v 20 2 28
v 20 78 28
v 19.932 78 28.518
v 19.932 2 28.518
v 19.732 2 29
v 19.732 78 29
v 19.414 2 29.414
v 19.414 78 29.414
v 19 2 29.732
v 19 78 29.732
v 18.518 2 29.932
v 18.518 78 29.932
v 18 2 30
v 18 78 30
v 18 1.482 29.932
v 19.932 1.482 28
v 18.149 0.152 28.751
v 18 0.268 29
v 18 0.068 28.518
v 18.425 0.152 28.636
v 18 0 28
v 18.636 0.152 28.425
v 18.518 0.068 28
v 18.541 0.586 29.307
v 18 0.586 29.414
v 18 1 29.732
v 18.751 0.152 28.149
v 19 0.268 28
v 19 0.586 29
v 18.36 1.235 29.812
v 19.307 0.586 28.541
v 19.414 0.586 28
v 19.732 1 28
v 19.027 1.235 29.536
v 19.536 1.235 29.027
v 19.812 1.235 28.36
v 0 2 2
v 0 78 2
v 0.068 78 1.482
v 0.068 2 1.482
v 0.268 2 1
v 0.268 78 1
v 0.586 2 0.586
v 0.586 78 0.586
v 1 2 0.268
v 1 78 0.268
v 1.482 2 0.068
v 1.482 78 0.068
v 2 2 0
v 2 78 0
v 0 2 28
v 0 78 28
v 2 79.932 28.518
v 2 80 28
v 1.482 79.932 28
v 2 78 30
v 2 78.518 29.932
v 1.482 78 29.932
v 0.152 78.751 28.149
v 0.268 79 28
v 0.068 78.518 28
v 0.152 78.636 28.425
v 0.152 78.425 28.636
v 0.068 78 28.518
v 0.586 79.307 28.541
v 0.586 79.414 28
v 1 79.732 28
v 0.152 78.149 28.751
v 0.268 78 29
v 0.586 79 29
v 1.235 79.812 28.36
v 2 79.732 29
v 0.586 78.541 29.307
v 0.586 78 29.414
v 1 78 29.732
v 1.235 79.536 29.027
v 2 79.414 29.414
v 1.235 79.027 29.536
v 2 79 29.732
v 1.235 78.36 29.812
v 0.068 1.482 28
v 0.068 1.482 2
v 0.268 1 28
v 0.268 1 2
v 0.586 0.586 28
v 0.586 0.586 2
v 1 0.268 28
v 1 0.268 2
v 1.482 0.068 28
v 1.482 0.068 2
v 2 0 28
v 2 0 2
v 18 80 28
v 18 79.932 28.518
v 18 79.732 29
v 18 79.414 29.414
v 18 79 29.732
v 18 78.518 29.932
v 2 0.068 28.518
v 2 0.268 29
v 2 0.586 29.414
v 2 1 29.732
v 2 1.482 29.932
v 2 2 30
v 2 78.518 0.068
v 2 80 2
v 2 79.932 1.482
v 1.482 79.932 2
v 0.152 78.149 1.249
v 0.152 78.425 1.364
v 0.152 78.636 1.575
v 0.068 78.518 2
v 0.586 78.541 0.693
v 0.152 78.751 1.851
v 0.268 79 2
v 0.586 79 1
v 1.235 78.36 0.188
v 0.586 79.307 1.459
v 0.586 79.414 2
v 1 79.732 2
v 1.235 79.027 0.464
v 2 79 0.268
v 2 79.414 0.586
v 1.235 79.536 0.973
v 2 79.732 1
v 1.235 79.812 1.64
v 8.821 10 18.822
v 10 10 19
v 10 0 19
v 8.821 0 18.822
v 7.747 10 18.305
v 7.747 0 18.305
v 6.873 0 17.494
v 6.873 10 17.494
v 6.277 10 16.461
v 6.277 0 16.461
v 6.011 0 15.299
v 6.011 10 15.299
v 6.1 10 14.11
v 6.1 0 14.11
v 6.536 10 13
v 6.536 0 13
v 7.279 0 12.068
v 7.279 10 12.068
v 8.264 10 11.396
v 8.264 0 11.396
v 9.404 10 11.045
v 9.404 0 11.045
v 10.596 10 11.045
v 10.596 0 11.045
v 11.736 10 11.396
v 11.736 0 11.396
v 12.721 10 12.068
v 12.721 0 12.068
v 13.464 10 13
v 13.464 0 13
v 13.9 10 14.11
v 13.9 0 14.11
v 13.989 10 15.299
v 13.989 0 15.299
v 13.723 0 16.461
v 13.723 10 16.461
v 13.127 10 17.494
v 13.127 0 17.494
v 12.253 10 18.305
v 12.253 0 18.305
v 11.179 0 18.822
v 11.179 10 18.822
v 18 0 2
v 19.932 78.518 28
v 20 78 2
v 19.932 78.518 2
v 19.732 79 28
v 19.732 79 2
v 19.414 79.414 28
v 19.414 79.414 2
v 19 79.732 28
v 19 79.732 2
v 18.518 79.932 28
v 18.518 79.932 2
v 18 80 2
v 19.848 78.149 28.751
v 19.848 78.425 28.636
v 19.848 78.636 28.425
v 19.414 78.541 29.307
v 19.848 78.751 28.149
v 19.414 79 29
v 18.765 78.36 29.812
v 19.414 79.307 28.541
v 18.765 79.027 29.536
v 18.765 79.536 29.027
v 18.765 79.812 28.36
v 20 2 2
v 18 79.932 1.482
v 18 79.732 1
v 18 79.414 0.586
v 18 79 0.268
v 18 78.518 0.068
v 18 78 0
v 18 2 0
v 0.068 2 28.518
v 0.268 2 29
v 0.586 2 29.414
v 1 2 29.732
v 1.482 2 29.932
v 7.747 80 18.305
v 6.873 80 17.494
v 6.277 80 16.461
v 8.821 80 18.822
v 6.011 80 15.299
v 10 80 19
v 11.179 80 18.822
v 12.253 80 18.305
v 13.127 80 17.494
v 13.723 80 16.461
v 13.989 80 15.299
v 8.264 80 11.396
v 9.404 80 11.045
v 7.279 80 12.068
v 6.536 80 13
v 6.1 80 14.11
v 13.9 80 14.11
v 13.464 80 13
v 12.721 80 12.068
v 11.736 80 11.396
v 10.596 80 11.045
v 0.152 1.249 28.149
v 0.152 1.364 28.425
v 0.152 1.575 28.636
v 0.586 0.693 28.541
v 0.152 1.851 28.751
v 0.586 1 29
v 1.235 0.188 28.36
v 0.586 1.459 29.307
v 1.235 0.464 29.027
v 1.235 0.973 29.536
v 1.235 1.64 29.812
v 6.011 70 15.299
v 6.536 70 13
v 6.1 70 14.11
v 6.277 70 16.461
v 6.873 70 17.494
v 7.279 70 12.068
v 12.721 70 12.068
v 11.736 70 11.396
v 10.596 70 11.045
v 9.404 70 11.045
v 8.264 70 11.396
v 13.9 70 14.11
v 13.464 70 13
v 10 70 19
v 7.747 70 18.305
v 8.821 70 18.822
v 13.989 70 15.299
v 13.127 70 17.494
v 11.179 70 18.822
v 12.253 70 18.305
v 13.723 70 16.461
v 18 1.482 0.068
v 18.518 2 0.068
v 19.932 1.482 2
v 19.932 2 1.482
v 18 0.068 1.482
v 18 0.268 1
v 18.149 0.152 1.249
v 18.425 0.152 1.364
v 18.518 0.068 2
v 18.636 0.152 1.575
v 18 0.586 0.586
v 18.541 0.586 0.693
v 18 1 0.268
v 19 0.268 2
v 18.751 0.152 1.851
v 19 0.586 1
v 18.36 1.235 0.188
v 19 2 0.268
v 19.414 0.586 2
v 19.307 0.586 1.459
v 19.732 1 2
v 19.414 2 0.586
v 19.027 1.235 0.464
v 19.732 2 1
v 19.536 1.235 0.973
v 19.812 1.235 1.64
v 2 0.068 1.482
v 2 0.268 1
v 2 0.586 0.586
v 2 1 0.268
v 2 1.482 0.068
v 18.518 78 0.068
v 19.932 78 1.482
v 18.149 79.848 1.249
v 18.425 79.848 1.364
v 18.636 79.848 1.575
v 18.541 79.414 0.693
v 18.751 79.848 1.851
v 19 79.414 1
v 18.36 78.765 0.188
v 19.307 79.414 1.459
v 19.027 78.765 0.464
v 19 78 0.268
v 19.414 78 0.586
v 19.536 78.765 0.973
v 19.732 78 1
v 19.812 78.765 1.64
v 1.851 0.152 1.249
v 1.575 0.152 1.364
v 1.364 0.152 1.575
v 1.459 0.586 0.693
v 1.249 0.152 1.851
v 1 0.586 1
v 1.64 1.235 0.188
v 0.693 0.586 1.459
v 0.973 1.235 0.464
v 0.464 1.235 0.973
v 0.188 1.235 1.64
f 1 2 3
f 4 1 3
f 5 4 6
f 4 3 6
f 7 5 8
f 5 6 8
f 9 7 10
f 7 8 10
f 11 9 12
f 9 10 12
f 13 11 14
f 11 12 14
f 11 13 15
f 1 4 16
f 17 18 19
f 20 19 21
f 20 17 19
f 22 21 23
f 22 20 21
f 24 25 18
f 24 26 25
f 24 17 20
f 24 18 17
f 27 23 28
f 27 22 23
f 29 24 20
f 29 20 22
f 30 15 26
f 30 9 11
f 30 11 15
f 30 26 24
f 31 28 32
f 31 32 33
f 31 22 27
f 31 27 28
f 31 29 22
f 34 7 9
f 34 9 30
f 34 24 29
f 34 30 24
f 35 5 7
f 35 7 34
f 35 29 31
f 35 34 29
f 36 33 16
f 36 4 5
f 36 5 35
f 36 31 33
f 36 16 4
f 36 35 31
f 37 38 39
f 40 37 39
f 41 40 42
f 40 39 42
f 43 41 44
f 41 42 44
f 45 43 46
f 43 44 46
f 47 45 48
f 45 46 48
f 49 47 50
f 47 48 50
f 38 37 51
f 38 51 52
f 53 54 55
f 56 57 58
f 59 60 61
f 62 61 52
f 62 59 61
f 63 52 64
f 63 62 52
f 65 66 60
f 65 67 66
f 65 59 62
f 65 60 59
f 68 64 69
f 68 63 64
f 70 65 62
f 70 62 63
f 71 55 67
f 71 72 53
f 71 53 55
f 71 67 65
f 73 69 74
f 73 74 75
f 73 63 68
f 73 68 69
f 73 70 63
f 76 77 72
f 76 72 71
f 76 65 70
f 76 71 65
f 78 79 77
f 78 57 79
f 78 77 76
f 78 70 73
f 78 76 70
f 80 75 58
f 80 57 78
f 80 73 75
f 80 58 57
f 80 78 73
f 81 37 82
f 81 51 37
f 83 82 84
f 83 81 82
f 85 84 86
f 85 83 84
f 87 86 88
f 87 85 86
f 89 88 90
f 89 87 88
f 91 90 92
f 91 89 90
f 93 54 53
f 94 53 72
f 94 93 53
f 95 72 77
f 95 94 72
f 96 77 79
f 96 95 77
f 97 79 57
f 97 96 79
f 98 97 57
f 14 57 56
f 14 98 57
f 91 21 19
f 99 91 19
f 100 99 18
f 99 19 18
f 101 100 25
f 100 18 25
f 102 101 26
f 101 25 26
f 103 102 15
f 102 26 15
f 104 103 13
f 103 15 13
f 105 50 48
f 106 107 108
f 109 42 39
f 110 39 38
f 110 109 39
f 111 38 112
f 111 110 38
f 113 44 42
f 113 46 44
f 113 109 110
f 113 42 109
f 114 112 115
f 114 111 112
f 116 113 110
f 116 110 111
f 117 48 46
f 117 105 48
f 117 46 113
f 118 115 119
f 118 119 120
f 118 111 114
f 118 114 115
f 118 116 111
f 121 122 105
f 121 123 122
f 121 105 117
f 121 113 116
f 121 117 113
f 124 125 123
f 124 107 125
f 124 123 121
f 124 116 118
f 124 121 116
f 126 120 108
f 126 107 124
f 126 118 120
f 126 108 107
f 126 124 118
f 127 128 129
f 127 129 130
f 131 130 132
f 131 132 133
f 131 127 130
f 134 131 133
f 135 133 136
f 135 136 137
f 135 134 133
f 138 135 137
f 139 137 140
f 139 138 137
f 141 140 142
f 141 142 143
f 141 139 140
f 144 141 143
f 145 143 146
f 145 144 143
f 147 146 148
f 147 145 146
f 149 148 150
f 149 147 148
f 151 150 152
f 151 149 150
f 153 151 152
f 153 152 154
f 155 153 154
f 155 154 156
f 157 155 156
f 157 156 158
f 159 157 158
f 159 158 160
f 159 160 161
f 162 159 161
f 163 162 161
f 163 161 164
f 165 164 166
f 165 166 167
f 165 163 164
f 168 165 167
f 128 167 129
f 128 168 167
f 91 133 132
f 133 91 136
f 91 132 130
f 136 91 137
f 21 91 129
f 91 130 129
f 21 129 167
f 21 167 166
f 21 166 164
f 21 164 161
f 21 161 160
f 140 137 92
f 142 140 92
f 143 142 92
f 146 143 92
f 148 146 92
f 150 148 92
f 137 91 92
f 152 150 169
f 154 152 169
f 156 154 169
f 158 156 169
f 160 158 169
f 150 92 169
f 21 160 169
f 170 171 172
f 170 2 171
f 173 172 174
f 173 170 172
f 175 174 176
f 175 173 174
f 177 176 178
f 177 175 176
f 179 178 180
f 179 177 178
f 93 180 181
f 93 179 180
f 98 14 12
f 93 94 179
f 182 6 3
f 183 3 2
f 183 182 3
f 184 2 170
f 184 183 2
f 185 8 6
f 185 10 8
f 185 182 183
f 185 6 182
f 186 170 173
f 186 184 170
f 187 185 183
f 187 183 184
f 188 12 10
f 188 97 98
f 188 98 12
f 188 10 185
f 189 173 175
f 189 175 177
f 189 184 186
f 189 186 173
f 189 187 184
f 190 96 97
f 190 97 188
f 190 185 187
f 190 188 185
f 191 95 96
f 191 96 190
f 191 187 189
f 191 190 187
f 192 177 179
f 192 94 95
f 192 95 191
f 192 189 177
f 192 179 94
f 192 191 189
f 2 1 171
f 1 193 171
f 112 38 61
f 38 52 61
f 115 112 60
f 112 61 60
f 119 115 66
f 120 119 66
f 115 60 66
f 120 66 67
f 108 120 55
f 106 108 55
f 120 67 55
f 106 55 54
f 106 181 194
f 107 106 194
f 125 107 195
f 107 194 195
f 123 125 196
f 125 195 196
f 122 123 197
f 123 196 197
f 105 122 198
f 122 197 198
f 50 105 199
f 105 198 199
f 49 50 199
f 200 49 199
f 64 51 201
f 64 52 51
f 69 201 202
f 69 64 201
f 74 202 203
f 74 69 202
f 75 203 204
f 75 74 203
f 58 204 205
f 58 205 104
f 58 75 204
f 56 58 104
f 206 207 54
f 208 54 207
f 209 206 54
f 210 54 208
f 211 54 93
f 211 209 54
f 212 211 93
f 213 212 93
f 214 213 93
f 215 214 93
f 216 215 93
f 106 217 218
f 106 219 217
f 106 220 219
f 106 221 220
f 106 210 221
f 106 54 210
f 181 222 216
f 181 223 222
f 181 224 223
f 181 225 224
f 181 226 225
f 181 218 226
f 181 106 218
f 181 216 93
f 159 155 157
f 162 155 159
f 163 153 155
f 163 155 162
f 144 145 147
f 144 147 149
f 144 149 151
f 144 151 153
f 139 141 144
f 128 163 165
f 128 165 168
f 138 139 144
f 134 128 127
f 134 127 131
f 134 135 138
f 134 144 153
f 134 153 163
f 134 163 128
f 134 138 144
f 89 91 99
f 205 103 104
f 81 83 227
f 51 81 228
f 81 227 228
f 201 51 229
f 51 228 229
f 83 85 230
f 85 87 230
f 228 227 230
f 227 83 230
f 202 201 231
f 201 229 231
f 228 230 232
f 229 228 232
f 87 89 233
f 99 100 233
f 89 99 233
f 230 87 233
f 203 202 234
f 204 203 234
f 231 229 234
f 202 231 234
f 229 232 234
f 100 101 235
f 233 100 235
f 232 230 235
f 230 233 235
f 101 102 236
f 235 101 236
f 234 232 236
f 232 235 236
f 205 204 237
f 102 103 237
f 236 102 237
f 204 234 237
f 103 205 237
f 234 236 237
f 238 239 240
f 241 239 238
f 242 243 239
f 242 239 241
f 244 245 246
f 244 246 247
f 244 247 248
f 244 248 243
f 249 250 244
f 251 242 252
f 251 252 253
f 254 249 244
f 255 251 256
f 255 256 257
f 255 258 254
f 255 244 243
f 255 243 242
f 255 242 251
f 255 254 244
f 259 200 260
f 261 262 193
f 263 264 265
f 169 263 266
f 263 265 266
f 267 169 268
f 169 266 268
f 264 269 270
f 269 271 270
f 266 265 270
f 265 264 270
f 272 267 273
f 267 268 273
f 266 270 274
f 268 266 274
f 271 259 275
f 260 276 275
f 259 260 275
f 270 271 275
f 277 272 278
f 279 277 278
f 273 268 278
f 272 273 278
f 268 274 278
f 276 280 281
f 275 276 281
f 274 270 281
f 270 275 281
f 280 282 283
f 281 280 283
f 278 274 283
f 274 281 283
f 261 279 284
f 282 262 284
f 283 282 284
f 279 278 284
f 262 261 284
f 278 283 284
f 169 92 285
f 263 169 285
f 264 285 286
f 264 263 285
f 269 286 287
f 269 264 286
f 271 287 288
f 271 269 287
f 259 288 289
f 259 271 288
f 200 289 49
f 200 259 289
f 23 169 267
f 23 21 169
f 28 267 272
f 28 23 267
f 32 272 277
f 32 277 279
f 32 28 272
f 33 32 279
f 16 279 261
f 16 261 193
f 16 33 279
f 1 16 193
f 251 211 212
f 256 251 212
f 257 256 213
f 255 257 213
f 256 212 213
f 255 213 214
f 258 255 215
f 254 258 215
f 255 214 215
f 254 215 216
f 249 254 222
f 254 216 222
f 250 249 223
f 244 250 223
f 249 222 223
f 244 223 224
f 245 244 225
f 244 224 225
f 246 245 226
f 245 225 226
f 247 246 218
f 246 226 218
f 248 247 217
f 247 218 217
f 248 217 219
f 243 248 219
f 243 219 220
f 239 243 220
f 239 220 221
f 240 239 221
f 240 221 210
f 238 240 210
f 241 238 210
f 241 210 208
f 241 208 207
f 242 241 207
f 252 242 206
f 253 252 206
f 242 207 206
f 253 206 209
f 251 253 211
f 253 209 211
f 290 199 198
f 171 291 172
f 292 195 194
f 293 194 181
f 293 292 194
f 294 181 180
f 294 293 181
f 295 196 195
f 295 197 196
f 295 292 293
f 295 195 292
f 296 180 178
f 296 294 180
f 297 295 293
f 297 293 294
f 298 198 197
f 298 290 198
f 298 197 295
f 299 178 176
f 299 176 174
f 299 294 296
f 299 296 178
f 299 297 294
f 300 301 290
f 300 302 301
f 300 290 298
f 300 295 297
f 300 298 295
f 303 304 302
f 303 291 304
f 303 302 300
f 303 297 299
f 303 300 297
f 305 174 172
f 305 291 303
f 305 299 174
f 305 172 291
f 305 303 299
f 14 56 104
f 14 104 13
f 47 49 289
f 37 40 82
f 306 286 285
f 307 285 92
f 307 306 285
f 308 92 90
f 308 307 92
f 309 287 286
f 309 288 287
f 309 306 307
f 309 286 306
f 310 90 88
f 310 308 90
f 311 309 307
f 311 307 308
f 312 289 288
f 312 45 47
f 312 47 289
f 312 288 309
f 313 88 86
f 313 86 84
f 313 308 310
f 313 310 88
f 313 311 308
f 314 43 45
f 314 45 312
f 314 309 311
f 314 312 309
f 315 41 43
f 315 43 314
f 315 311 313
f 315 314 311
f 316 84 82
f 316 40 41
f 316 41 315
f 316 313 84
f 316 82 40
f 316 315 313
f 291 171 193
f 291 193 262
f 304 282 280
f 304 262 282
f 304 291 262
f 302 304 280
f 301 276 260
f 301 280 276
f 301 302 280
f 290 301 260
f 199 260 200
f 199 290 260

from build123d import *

# Parameters (mm, degrees)
SKETCH1_W           = 20
SKETCH1_H           = 80
BOSS_EXTRUDE1_DEPTH = 30
FILLET1_R           = 2
SKETCH2_R           = 4
CUT_EXTRUDE1_DEPTH  = 10
CUT_EXTRUDE2_START  = -10
SKETCH3_R           = 4
CUT_EXTRUDE2_DEPTH  = 10


with BuildPart() as part:
    # Sketch1 → Boss-Extrude1 (new body)
    with BuildSketch(Plane.XY):
        with Locations((10, 40)):
            Rectangle(SKETCH1_W, SKETCH1_H)
    extrude(amount=BOSS_EXTRUDE1_DEPTH)

    # Fillet1
    fillet1_edges = [part.edges().sort_by_distance(p)[0] for p in [
        (10, 80, 30),
        (20, 40, 30),
        (10, 0, 30),
        (20, 40, 0),
        (10, 80, 0),
        (0, 40, 0),
        (10, 0, 0),
        (20, 0, 15),
        (20, 80, 15),
        (0, 80, 15),
        (0, 0, 15),
        (0, 40, 30),
    ]]
    fillet(fillet1_edges, radius=FILLET1_R)

    # Sketch2 → Cut-Extrude1 (cut)
    with BuildSketch(Plane(origin=(0, 80, 0), x_dir=(1, 0, 0), z_dir=(0, 1, 0))):
        with Locations(Location((10, -15, 0), (0, 0, 270))):
            Circle(SKETCH2_R)
    extrude(amount=-CUT_EXTRUDE1_DEPTH, mode=Mode.SUBTRACT)

    # Sketch3 → Cut-Extrude2 (cut)
    with BuildSketch(Plane.XZ.offset(CUT_EXTRUDE2_START)):
        with Locations(Location((10, 15, 0), (0, 0, 90))):
            Circle(SKETCH3_R)
    extrude(amount=CUT_EXTRUDE2_DEPTH, mode=Mode.SUBTRACT)


solid = part.part
